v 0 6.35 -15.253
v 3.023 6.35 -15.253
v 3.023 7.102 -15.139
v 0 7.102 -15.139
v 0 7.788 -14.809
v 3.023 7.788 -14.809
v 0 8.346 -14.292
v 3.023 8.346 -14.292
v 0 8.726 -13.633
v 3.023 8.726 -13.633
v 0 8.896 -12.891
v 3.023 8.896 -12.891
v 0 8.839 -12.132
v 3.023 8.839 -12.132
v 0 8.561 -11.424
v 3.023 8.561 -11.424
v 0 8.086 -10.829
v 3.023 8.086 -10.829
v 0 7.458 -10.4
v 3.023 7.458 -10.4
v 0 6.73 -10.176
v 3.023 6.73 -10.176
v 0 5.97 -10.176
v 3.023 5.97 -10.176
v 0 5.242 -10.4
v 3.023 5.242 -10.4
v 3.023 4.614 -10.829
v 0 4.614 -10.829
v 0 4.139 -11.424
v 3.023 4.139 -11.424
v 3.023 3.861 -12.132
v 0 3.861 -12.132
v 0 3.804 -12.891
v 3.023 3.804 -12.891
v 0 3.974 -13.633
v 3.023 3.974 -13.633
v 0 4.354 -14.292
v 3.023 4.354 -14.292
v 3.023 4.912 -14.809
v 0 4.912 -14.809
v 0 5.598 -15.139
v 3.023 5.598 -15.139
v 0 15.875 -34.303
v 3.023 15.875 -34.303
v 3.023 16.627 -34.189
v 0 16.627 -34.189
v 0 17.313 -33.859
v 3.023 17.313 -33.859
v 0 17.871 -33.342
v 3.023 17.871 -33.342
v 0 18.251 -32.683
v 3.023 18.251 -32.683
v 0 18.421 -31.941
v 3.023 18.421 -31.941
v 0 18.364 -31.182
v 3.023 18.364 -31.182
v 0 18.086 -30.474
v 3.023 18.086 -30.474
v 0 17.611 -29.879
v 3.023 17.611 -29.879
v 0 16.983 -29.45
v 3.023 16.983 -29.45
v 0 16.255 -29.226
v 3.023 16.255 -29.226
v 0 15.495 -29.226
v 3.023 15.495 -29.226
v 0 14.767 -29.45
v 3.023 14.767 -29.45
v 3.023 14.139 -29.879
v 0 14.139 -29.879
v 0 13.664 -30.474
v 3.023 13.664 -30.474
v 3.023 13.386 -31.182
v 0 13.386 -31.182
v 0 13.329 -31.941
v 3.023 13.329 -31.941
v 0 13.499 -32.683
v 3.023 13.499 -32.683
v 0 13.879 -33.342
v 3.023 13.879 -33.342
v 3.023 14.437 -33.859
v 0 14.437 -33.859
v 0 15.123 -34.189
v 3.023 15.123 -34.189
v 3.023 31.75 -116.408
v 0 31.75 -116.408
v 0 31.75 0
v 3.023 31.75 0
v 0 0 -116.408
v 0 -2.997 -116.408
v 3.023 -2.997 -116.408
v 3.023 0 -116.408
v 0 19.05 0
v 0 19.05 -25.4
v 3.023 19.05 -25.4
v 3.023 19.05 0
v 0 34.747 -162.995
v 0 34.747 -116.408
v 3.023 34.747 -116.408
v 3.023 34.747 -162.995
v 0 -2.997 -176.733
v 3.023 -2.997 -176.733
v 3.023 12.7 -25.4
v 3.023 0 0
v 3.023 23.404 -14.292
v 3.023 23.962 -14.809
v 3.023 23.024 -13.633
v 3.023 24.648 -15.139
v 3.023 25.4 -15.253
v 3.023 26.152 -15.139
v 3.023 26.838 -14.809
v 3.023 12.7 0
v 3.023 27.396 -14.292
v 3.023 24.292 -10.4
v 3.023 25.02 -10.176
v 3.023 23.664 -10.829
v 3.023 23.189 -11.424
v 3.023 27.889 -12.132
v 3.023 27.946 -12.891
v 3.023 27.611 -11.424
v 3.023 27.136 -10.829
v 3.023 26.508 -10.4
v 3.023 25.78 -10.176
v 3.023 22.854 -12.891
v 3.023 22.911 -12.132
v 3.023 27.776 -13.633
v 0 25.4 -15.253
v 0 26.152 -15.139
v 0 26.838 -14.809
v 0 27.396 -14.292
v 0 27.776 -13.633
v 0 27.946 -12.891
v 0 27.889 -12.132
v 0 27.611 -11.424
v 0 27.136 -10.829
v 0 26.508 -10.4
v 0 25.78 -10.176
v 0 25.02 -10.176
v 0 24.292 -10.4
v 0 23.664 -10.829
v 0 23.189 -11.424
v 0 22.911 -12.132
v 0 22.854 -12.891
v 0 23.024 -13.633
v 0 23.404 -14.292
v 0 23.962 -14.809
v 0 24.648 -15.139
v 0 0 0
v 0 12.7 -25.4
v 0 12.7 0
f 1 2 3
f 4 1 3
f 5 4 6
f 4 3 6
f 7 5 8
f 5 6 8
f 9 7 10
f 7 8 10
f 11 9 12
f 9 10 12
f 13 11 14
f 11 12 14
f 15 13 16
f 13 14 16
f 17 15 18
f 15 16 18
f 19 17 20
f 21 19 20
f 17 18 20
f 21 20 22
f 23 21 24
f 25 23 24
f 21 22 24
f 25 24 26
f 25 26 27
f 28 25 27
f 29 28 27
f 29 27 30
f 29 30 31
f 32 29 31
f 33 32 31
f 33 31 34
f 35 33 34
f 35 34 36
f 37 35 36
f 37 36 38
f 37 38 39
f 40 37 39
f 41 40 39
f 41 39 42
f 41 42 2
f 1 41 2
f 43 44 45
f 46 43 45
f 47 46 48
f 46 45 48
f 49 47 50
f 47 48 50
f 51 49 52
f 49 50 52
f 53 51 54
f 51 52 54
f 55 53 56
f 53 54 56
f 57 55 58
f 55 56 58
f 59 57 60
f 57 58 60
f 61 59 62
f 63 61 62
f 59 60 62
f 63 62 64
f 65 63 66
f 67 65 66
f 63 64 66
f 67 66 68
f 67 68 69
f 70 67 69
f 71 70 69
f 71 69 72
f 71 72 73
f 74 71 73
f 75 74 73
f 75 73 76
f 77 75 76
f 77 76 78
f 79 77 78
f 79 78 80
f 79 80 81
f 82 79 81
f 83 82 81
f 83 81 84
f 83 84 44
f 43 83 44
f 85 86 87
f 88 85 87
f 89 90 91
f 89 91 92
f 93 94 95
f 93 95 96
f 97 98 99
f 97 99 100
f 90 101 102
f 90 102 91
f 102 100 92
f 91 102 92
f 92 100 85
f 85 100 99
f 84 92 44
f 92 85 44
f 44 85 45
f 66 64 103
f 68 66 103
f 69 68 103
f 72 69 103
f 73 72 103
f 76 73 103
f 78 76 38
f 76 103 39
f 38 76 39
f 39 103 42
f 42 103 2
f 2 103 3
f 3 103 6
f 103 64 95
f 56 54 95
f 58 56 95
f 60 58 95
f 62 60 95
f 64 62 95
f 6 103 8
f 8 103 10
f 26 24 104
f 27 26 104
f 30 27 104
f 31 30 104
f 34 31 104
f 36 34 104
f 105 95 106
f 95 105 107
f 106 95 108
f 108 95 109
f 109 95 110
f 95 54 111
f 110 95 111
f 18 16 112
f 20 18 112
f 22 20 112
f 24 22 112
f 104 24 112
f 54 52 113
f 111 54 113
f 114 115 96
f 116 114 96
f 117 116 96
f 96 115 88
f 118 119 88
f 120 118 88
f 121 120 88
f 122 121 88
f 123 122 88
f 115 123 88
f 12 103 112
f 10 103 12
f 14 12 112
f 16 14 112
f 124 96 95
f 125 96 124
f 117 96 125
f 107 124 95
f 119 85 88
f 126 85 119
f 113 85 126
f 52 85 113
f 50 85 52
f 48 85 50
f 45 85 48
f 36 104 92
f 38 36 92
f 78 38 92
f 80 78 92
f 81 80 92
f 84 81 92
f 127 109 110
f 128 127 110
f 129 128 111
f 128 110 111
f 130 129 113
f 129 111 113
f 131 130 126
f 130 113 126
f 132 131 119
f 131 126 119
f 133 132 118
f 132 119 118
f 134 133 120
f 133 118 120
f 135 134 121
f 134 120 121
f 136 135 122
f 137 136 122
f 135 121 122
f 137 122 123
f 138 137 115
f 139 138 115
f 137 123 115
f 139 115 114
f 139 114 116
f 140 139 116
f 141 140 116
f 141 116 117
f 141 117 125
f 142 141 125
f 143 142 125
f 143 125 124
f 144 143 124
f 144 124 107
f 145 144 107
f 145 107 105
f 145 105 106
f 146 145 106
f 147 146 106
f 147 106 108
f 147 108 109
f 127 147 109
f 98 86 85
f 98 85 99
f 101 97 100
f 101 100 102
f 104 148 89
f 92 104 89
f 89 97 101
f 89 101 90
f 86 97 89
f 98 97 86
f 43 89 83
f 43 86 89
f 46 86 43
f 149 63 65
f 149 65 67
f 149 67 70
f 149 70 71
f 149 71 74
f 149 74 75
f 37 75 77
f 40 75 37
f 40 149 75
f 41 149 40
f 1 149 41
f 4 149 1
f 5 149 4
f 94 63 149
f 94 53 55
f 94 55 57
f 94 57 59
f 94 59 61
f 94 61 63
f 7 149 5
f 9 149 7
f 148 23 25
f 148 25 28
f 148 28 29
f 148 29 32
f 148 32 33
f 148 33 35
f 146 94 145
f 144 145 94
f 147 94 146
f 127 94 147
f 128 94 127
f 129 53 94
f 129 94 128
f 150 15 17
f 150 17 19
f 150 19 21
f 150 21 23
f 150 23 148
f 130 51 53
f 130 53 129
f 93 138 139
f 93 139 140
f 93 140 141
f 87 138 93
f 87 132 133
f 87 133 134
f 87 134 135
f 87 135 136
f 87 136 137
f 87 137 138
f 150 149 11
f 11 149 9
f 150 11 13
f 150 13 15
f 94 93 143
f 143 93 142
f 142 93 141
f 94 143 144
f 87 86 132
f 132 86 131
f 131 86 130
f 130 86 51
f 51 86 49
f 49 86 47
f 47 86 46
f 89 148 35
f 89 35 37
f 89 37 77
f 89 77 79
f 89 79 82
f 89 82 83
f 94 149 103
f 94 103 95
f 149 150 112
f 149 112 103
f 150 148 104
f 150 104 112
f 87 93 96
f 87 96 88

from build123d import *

# Parameters (mm, degrees)
SKETCH2_2_R         = 2.0193
BOSS_EXTRUDE2_DEPTH = 3.0226
SKETCH6_R           = 2.5527
CUT_EXTRUDE4_DEPTH  = 4.0226


with BuildPart() as part:
    # Sketch2<2> → Boss-Extrude2 (new body)
    with BuildSketch(Plane(origin=(0, 0, 0), x_dir=(0, 0, -1), z_dir=(1, 0, 0))):
        Polygon((0, 0), (0, 12.7), (25.4, 12.7), (25.4, 19.05), (0, 19.05), (0, 31.75), (38.1, 31.75), (116.4082, 31.75), (116.4082, 34.7472), (162.99536189, 34.7472), (176.7332, -2.9972), (116.4082, -2.9972), (116.4082, 0), (38.1, 0), align=None)
        with Locations((12.7, 25.4)):
            Circle(SKETCH2_2_R, mode=Mode.SUBTRACT)
        with Locations((12.7, 6.35)):
            Circle(SKETCH2_2_R, mode=Mode.SUBTRACT)
        with Locations((31.75, 15.875)):
            Circle(SKETCH2_2_R, mode=Mode.SUBTRACT)
    extrude(amount=BOSS_EXTRUDE2_DEPTH)

    # Sketch6 → Cut-Extrude4 (cut, through all)
    with BuildSketch(Plane(origin=(3.0226, 0, 0), x_dir=(0, 0, -1), z_dir=(1, 0, 0))):
        with Locations((12.7, 25.4)):
            Circle(SKETCH6_R)
        with Locations((31.75, 15.875)):
            Circle(SKETCH6_R)
        with Locations((12.7, 6.35)):
            Circle(SKETCH6_R)
    extrude(amount=-CUT_EXTRUDE4_DEPTH, mode=Mode.SUBTRACT)


solid = part.part
